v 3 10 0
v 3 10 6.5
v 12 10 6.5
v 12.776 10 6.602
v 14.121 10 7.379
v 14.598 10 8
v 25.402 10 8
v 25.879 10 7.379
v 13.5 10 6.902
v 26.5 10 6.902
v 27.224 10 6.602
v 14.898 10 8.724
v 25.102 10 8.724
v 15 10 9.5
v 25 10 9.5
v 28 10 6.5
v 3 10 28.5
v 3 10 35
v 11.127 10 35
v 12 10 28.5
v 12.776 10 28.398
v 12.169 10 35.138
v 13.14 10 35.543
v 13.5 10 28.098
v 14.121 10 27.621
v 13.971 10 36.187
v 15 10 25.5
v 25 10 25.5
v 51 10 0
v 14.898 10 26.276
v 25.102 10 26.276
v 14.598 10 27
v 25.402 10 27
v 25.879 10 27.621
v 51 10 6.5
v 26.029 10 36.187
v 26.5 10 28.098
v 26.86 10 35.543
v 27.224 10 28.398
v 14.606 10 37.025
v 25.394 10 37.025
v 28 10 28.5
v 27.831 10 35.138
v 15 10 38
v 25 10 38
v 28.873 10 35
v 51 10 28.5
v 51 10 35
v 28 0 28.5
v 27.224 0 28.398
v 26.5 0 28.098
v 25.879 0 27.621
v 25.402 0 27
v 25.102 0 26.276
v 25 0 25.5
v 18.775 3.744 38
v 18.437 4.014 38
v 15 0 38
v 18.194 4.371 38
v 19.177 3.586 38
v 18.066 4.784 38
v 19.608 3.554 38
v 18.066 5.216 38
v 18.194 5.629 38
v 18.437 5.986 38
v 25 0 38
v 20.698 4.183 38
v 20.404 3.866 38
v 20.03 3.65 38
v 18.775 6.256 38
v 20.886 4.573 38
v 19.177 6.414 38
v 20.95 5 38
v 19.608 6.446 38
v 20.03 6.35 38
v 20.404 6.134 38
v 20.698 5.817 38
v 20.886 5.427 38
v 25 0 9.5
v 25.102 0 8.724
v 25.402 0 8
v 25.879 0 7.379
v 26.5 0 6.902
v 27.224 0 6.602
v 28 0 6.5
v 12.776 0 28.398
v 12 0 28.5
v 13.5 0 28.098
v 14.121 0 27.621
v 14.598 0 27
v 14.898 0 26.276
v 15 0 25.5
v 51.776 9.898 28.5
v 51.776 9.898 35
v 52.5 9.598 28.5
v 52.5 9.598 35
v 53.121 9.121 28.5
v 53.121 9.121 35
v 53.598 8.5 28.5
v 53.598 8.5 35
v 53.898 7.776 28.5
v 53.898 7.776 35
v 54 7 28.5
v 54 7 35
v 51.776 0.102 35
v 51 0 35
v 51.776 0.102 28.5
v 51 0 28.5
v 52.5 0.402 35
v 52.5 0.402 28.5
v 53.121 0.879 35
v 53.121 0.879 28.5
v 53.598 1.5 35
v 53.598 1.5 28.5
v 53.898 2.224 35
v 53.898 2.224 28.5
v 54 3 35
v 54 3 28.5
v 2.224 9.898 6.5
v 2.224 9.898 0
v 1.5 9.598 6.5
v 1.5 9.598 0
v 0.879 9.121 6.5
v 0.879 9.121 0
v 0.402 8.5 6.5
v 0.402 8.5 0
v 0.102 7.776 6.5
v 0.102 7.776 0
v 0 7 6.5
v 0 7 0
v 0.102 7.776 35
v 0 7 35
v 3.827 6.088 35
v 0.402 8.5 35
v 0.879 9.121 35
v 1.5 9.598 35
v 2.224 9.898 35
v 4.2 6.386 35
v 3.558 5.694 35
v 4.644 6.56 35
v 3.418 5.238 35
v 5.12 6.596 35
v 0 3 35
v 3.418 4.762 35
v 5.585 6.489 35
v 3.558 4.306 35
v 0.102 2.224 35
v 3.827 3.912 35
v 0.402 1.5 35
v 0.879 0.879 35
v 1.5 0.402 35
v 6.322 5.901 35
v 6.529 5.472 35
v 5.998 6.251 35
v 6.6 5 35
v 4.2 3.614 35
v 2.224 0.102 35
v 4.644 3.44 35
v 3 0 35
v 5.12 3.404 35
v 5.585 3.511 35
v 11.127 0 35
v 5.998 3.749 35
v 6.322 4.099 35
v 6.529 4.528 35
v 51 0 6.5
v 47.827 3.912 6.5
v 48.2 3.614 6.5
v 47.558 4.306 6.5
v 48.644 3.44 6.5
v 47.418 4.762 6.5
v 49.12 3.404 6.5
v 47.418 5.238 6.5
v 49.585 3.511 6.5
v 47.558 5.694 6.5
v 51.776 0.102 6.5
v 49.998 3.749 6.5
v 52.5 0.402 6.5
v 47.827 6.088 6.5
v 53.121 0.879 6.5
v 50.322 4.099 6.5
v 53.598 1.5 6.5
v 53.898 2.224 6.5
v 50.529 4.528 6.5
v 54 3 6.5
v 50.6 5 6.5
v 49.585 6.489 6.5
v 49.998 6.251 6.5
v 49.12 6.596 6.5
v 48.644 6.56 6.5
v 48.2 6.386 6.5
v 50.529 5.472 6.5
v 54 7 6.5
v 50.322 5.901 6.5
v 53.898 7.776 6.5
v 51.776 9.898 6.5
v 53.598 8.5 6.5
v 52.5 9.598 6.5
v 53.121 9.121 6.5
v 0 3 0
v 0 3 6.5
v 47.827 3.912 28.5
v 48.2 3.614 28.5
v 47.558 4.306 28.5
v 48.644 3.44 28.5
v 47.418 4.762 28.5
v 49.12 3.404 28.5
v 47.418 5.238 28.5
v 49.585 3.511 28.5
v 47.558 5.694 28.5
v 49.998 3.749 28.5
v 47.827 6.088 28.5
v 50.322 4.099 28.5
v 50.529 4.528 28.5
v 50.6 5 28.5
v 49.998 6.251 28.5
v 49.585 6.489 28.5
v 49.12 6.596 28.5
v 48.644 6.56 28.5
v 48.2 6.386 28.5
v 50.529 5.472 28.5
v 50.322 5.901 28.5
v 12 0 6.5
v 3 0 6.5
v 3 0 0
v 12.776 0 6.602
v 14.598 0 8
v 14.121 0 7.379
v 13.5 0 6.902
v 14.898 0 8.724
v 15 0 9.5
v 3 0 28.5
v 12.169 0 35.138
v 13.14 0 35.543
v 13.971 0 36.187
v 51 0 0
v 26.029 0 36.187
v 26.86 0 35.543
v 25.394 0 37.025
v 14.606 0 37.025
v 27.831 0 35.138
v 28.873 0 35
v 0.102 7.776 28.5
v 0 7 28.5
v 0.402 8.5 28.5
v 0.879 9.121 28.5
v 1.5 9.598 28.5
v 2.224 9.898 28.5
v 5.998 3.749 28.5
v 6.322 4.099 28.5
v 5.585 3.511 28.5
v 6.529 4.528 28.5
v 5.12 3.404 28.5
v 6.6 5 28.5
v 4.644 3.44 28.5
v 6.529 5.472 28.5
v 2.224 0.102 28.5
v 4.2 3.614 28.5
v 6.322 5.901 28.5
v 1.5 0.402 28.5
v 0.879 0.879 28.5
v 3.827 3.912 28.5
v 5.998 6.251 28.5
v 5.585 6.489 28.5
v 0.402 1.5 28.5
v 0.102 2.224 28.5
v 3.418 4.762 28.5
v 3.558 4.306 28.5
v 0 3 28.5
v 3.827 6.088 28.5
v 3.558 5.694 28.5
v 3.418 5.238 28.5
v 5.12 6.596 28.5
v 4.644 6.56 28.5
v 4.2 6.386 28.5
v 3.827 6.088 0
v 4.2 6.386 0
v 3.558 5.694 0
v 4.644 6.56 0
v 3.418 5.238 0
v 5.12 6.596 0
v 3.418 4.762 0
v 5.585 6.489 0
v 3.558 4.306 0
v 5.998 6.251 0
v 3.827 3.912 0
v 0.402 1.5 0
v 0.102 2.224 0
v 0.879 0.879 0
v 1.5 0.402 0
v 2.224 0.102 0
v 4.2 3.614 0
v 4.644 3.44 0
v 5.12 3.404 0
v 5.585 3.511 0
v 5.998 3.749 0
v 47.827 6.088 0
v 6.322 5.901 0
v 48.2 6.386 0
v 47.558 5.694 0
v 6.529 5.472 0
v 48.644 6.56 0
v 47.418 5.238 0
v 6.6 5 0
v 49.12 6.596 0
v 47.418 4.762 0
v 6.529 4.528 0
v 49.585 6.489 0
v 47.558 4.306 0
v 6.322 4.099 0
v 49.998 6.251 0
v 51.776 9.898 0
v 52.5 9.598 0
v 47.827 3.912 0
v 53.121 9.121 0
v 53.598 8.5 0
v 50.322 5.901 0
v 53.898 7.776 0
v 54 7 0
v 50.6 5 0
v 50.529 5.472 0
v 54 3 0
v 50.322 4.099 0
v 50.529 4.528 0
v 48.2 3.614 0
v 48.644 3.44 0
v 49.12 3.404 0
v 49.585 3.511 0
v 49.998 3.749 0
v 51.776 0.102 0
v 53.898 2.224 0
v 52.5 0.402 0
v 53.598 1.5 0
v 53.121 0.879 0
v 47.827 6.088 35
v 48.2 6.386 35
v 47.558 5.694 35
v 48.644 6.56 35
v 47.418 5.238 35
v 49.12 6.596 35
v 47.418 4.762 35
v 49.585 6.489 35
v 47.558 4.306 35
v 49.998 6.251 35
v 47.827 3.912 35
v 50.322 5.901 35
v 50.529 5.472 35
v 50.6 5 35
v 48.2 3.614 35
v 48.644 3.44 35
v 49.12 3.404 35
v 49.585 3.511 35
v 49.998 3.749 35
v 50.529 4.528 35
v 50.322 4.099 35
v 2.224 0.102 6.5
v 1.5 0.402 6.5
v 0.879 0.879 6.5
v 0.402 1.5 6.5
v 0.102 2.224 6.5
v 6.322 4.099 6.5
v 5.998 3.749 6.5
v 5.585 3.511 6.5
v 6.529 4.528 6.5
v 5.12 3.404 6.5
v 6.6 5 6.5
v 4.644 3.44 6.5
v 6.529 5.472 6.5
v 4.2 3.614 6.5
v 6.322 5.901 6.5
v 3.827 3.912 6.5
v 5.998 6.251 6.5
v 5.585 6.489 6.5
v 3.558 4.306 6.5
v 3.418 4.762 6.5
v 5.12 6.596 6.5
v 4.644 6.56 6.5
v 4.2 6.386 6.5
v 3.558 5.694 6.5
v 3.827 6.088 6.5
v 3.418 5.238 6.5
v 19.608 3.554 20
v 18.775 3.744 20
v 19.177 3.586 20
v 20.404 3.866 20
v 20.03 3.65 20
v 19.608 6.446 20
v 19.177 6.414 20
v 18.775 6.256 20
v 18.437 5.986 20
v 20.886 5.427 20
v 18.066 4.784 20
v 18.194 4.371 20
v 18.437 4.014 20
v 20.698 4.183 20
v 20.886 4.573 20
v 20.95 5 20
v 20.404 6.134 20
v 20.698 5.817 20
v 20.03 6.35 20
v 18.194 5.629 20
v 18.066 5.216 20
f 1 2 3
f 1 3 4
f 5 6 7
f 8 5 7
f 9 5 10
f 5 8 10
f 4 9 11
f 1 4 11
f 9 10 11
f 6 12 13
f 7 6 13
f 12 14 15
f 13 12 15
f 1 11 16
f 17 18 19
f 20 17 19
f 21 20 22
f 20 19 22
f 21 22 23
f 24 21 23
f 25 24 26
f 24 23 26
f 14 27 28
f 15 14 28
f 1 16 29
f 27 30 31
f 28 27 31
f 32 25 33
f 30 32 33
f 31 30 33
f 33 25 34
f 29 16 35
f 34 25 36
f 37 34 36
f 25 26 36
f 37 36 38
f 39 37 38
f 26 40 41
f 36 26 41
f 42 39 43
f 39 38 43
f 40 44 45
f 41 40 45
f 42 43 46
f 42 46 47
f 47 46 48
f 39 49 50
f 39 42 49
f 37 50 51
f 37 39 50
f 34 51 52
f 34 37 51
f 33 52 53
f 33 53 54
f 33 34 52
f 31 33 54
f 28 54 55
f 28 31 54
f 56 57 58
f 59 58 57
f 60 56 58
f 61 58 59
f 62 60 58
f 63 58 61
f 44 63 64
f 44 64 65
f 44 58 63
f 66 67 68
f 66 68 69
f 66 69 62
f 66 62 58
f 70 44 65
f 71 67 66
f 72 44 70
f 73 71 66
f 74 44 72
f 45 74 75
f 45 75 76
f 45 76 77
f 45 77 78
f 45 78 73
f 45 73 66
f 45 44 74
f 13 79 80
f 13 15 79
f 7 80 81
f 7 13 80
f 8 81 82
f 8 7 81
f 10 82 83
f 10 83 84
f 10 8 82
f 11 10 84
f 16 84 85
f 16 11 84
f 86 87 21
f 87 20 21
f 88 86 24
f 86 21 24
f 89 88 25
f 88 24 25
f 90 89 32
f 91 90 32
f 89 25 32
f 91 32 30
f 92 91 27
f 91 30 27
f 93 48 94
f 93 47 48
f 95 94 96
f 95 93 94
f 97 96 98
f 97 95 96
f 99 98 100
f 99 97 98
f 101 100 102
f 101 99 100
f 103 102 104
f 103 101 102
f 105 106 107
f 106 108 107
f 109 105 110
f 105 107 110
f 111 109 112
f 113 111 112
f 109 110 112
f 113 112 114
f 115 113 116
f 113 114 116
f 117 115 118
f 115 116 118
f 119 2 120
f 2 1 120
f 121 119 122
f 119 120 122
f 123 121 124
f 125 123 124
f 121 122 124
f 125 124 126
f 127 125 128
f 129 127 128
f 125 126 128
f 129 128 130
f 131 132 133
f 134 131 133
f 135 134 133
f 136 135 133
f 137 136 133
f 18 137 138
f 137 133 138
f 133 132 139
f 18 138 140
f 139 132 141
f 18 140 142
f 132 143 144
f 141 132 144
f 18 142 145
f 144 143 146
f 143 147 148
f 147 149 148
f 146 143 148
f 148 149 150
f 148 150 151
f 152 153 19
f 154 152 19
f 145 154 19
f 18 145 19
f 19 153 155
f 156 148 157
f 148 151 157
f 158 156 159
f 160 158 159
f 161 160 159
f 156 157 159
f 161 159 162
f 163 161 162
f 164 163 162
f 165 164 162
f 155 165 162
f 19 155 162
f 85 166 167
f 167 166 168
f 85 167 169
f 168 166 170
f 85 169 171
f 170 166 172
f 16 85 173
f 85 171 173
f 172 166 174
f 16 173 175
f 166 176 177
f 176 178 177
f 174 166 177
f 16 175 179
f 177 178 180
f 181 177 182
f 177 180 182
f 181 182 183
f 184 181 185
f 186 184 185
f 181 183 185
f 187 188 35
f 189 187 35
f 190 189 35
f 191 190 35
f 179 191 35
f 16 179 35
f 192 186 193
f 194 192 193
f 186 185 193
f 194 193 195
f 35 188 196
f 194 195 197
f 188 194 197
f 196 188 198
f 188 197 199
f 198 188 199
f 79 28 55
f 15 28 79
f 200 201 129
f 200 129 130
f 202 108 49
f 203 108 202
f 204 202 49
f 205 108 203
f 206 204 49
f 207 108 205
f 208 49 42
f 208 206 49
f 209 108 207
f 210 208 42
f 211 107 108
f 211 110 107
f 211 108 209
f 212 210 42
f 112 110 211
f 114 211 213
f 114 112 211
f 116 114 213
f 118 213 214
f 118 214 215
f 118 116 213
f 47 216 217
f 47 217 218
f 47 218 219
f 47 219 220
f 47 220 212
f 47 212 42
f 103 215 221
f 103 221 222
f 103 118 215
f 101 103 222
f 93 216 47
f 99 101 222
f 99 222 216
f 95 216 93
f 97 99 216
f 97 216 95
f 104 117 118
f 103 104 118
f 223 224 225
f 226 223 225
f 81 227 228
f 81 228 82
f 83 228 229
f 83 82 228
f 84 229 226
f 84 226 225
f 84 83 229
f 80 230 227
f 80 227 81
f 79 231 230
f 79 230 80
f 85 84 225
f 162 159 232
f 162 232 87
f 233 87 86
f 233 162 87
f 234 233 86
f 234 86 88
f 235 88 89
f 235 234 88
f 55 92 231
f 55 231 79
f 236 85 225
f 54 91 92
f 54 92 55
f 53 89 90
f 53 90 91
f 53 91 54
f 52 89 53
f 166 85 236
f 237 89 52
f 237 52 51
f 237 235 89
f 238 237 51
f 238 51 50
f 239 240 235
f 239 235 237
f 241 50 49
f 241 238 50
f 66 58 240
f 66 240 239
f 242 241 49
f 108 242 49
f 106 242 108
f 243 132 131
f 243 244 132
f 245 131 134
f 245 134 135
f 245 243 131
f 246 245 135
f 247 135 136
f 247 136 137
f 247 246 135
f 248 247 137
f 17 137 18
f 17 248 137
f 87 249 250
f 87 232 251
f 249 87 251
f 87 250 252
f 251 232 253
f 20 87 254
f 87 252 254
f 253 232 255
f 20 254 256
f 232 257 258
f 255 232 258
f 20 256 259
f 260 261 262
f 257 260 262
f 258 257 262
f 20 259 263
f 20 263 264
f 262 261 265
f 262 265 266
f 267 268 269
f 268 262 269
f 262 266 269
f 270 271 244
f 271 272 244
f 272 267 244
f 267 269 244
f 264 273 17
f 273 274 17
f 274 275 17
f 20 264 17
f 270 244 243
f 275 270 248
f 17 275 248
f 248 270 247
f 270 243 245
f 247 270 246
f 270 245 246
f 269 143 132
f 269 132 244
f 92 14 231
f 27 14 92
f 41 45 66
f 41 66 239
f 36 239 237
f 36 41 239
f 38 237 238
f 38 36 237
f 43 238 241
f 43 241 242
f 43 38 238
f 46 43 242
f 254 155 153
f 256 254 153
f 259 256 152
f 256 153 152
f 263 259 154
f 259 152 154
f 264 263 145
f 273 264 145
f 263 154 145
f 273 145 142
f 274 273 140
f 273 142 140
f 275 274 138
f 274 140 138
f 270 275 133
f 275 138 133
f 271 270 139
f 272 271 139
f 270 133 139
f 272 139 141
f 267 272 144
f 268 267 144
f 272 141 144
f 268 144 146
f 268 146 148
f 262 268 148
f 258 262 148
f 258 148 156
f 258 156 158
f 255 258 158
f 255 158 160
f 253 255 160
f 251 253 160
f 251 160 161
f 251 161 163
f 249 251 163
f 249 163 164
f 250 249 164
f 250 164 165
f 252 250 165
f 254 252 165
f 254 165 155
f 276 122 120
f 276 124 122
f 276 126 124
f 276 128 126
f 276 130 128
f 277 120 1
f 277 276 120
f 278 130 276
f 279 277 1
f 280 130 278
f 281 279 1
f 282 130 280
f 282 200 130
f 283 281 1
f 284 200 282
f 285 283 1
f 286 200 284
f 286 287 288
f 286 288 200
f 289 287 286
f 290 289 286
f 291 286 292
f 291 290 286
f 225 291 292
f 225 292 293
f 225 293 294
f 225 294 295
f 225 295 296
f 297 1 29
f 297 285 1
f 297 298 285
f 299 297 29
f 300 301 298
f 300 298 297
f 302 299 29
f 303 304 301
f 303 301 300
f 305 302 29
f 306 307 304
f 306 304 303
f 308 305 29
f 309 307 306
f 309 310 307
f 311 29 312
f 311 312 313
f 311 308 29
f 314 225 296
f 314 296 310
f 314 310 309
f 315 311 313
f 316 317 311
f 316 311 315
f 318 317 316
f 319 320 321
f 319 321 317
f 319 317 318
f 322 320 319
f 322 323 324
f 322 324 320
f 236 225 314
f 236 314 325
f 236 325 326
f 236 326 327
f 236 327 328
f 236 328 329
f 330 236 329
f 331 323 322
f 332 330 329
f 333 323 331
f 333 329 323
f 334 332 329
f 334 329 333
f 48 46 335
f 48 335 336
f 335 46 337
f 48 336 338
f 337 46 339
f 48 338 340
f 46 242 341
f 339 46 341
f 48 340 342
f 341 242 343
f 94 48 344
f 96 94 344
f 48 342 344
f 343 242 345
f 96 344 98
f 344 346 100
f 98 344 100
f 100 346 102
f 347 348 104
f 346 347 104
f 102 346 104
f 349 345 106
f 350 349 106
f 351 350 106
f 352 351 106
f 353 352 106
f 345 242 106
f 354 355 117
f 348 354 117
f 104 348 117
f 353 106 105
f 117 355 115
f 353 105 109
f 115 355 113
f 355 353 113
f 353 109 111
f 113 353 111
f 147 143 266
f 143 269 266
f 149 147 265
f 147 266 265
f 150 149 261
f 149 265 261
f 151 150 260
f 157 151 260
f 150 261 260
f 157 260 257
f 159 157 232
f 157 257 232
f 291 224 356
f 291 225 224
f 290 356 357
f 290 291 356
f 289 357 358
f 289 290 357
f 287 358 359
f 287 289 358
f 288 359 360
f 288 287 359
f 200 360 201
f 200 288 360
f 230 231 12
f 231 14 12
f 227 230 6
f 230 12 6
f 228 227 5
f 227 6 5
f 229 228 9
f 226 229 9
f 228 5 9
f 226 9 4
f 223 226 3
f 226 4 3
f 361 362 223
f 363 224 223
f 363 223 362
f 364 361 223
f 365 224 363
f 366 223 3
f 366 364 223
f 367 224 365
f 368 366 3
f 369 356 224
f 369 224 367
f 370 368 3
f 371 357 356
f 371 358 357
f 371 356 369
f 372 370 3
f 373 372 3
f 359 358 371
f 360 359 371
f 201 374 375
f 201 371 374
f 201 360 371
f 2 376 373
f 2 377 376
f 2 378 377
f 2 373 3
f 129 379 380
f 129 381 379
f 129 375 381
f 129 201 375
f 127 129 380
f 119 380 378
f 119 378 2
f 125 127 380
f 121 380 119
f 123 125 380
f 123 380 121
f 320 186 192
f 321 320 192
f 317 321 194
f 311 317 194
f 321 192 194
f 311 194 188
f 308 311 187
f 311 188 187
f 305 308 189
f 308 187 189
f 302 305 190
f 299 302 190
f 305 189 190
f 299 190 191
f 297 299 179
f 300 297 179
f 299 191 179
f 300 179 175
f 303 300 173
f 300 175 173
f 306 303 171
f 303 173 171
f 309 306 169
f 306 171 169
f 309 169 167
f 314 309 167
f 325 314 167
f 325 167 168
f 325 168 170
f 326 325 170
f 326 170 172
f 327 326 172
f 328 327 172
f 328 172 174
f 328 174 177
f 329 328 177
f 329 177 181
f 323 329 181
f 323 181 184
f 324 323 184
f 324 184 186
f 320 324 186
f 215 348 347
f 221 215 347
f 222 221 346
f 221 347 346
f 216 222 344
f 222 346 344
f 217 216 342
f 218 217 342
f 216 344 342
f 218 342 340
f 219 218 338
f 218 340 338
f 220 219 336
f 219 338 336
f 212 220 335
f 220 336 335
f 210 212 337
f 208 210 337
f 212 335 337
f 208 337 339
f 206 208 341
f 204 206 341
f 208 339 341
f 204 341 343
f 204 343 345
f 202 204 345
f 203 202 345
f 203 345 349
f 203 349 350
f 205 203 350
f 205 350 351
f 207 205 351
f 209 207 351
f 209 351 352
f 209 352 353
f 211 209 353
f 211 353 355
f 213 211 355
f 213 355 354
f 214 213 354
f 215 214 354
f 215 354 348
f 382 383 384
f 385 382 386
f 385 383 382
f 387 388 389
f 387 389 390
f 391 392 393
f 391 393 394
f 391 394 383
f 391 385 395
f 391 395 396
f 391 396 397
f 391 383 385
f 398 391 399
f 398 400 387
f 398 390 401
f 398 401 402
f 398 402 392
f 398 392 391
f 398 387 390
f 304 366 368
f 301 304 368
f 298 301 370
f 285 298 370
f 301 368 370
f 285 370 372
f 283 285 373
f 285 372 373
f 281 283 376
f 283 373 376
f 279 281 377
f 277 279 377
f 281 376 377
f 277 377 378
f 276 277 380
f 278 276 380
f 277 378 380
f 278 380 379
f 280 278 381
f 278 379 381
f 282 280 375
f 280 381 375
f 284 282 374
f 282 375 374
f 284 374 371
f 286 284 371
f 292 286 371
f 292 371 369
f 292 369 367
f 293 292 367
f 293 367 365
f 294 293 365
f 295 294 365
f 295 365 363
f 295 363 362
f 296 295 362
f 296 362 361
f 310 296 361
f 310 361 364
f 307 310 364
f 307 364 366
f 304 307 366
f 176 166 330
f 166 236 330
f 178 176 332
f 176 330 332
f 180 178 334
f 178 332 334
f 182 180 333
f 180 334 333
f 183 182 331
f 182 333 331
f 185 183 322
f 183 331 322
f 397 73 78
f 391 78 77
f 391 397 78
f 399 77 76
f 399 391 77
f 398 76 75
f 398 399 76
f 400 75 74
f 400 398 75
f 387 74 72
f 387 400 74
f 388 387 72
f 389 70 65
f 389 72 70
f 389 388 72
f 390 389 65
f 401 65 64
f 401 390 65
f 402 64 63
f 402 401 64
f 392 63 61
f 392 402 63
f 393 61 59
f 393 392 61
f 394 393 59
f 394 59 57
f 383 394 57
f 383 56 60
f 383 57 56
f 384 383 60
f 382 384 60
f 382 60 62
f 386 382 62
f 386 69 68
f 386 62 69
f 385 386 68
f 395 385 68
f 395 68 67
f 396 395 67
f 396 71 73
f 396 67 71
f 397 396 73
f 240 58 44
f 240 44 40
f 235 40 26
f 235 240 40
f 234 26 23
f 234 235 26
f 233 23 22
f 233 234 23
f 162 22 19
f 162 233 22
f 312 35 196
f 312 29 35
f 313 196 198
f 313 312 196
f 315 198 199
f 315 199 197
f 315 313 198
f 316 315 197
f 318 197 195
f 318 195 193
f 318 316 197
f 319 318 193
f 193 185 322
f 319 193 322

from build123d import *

# Parameters (mm, degrees)
SKETCH1_W               = 54
SKETCH1_H               = 35
BOSS_EXTRUDE1_DEPTH     = 10
SKETCH2_W               = 22
SKETCH2_H               = 10
CUT_EXTRUDE1_DEPTH      = 29
SKETCH3_W               = 22
SKETCH3_H               = 10
CUT_EXTRUDE2_DEPTH      = 15
SKETCH5_R               = 1.6
CUT_EXTRUDE4_DEPTH      = 66.122960621
FILLET1_R               = 3
FILLET2_R               = 3
SKETCH8_W               = 10
SKETCH8_H               = 10
BOSS_EXTRUDE2_DEPTH     = 3
CUT_EXTRUDE5_DEPTH      = 4
CUT_EXTRUDE5_DEPTH_BACK = 15
SKETCH6_R               = 1.45
FILLET3_R               = 4


with BuildPart() as part:
    # Sketch1 → Boss-Extrude1 (new body)
    with BuildSketch(Plane(origin=(0, 0, 0), x_dir=(1, 0, 0), z_dir=(0, 1, 0))):
        with Locations((27, -17.5)):
            Rectangle(SKETCH1_W, SKETCH1_H)
    extrude(amount=BOSS_EXTRUDE1_DEPTH)

    # Sketch2 → Cut-Extrude1 (cut)
    with BuildSketch(Plane(origin=(54, 0, 0), x_dir=(0, 0, -1), z_dir=(1, 0, 0))):
        with Locations((-17.5, 5)):
            Rectangle(SKETCH2_W, SKETCH2_H)
    extrude(amount=-CUT_EXTRUDE1_DEPTH, mode=Mode.SUBTRACT)

    # Sketch3 → Cut-Extrude2 (cut)
    with BuildSketch(Plane.ZY):
        with Locations((17.5, 5)):
            Rectangle(SKETCH3_W, SKETCH3_H)
    extrude(amount=-CUT_EXTRUDE2_DEPTH, mode=Mode.SUBTRACT)

    # Sketch5 → Cut-Extrude4 (cut, through all)
    with BuildSketch(Plane.XY.offset(35)):
        with Locations((5, 5)):
            Circle(SKETCH5_R)
        with Locations((49, 5)):
            Circle(SKETCH5_R)
    extrude(amount=-CUT_EXTRUDE4_DEPTH, mode=Mode.SUBTRACT)

    # Fillet1
    fillet1_edges = [part.edges().sort_by_distance(p)[0] for p in [
        (54, 10, 31.75),
        (54, 0, 3.25),
        (54, 10, 3.25),
        (0, 0, 31.75),
        (0, 10, 31.75),
        (0, 10, 3.25),
        (54, 0, 31.75),
        (0, 0, 3.25),
    ]]
    fillet(fillet1_edges, radius=FILLET1_R)

    # Fillet2
    fillet2_edges = [part.edges().sort_by_distance(p)[0] for p in [
        (25, 5, 28.5),
        (25, 5, 6.5),
        (15, 5, 6.5),
        (15, 5, 28.5),
    ]]
    fillet(fillet2_edges, radius=FILLET2_R)

    # Sketch8 → Boss-Extrude2 (add)
    with BuildSketch(Plane.XY.offset(35)):
        with Locations((20, 5)):
            Rectangle(SKETCH8_W, SKETCH8_H)
    extrude(amount=BOSS_EXTRUDE2_DEPTH)

    # Sketch6 → Cut-Extrude5 (cut, two sides: drawn at the far end of the back side and taken through both)
    with BuildSketch(Plane.XY.offset(35).offset(-CUT_EXTRUDE5_DEPTH_BACK)):
        with Locations((19.5, 5)):
            Circle(SKETCH6_R)
    extrude(amount=CUT_EXTRUDE5_DEPTH + CUT_EXTRUDE5_DEPTH_BACK, mode=Mode.SUBTRACT)

    # Fillet3
    # the kernel refuses this fillet: 4 mm, written as the material it adds along each edge
    with BuildSketch(Plane(origin=(25, 10, 35), x_dir=(0, 0, 1), z_dir=(0, -1, 0))) as fillet3_piece_1:
        with BuildLine():
            CenterArc((4, -3.872983346), FILLET3_R, 104.477512186, 75.522487814)
            Line((0, -3.872983346), (-0.08, -3.872983346))
            Line((-0.08, -3.872983346), (-0.08, 0))
            Line((-0.08, 0), (0, 0.08))
            ThreePointArc((0, 0.08), (1.5, 0.08), (2.98, 0.077459667))
            Line((2.98, 0.077459667), (3, 0))
        make_face()
    extrude(amount=10)
    with BuildSketch(Plane(origin=(15, 0, 35), x_dir=(-1, 0, 0), z_dir=(0, 1, 0))) as fillet3_piece_2:
        with BuildLine():
            CenterArc((3.872983346, 4), FILLET3_R, 194.477512186, 75.522487814)
            Line((0, 3), (-0.077459667, 2.98))
            ThreePointArc((-0.077459667, 2.98), (-0.08, 1.5), (-0.08, 0))
            Line((-0.08, 0), (0, -0.08))
            Line((0, -0.08), (3.872983346, -0.08))
            Line((3.872983346, -0.08), (3.872983346, 0))
        make_face()
    extrude(amount=10)


solid = part.part
